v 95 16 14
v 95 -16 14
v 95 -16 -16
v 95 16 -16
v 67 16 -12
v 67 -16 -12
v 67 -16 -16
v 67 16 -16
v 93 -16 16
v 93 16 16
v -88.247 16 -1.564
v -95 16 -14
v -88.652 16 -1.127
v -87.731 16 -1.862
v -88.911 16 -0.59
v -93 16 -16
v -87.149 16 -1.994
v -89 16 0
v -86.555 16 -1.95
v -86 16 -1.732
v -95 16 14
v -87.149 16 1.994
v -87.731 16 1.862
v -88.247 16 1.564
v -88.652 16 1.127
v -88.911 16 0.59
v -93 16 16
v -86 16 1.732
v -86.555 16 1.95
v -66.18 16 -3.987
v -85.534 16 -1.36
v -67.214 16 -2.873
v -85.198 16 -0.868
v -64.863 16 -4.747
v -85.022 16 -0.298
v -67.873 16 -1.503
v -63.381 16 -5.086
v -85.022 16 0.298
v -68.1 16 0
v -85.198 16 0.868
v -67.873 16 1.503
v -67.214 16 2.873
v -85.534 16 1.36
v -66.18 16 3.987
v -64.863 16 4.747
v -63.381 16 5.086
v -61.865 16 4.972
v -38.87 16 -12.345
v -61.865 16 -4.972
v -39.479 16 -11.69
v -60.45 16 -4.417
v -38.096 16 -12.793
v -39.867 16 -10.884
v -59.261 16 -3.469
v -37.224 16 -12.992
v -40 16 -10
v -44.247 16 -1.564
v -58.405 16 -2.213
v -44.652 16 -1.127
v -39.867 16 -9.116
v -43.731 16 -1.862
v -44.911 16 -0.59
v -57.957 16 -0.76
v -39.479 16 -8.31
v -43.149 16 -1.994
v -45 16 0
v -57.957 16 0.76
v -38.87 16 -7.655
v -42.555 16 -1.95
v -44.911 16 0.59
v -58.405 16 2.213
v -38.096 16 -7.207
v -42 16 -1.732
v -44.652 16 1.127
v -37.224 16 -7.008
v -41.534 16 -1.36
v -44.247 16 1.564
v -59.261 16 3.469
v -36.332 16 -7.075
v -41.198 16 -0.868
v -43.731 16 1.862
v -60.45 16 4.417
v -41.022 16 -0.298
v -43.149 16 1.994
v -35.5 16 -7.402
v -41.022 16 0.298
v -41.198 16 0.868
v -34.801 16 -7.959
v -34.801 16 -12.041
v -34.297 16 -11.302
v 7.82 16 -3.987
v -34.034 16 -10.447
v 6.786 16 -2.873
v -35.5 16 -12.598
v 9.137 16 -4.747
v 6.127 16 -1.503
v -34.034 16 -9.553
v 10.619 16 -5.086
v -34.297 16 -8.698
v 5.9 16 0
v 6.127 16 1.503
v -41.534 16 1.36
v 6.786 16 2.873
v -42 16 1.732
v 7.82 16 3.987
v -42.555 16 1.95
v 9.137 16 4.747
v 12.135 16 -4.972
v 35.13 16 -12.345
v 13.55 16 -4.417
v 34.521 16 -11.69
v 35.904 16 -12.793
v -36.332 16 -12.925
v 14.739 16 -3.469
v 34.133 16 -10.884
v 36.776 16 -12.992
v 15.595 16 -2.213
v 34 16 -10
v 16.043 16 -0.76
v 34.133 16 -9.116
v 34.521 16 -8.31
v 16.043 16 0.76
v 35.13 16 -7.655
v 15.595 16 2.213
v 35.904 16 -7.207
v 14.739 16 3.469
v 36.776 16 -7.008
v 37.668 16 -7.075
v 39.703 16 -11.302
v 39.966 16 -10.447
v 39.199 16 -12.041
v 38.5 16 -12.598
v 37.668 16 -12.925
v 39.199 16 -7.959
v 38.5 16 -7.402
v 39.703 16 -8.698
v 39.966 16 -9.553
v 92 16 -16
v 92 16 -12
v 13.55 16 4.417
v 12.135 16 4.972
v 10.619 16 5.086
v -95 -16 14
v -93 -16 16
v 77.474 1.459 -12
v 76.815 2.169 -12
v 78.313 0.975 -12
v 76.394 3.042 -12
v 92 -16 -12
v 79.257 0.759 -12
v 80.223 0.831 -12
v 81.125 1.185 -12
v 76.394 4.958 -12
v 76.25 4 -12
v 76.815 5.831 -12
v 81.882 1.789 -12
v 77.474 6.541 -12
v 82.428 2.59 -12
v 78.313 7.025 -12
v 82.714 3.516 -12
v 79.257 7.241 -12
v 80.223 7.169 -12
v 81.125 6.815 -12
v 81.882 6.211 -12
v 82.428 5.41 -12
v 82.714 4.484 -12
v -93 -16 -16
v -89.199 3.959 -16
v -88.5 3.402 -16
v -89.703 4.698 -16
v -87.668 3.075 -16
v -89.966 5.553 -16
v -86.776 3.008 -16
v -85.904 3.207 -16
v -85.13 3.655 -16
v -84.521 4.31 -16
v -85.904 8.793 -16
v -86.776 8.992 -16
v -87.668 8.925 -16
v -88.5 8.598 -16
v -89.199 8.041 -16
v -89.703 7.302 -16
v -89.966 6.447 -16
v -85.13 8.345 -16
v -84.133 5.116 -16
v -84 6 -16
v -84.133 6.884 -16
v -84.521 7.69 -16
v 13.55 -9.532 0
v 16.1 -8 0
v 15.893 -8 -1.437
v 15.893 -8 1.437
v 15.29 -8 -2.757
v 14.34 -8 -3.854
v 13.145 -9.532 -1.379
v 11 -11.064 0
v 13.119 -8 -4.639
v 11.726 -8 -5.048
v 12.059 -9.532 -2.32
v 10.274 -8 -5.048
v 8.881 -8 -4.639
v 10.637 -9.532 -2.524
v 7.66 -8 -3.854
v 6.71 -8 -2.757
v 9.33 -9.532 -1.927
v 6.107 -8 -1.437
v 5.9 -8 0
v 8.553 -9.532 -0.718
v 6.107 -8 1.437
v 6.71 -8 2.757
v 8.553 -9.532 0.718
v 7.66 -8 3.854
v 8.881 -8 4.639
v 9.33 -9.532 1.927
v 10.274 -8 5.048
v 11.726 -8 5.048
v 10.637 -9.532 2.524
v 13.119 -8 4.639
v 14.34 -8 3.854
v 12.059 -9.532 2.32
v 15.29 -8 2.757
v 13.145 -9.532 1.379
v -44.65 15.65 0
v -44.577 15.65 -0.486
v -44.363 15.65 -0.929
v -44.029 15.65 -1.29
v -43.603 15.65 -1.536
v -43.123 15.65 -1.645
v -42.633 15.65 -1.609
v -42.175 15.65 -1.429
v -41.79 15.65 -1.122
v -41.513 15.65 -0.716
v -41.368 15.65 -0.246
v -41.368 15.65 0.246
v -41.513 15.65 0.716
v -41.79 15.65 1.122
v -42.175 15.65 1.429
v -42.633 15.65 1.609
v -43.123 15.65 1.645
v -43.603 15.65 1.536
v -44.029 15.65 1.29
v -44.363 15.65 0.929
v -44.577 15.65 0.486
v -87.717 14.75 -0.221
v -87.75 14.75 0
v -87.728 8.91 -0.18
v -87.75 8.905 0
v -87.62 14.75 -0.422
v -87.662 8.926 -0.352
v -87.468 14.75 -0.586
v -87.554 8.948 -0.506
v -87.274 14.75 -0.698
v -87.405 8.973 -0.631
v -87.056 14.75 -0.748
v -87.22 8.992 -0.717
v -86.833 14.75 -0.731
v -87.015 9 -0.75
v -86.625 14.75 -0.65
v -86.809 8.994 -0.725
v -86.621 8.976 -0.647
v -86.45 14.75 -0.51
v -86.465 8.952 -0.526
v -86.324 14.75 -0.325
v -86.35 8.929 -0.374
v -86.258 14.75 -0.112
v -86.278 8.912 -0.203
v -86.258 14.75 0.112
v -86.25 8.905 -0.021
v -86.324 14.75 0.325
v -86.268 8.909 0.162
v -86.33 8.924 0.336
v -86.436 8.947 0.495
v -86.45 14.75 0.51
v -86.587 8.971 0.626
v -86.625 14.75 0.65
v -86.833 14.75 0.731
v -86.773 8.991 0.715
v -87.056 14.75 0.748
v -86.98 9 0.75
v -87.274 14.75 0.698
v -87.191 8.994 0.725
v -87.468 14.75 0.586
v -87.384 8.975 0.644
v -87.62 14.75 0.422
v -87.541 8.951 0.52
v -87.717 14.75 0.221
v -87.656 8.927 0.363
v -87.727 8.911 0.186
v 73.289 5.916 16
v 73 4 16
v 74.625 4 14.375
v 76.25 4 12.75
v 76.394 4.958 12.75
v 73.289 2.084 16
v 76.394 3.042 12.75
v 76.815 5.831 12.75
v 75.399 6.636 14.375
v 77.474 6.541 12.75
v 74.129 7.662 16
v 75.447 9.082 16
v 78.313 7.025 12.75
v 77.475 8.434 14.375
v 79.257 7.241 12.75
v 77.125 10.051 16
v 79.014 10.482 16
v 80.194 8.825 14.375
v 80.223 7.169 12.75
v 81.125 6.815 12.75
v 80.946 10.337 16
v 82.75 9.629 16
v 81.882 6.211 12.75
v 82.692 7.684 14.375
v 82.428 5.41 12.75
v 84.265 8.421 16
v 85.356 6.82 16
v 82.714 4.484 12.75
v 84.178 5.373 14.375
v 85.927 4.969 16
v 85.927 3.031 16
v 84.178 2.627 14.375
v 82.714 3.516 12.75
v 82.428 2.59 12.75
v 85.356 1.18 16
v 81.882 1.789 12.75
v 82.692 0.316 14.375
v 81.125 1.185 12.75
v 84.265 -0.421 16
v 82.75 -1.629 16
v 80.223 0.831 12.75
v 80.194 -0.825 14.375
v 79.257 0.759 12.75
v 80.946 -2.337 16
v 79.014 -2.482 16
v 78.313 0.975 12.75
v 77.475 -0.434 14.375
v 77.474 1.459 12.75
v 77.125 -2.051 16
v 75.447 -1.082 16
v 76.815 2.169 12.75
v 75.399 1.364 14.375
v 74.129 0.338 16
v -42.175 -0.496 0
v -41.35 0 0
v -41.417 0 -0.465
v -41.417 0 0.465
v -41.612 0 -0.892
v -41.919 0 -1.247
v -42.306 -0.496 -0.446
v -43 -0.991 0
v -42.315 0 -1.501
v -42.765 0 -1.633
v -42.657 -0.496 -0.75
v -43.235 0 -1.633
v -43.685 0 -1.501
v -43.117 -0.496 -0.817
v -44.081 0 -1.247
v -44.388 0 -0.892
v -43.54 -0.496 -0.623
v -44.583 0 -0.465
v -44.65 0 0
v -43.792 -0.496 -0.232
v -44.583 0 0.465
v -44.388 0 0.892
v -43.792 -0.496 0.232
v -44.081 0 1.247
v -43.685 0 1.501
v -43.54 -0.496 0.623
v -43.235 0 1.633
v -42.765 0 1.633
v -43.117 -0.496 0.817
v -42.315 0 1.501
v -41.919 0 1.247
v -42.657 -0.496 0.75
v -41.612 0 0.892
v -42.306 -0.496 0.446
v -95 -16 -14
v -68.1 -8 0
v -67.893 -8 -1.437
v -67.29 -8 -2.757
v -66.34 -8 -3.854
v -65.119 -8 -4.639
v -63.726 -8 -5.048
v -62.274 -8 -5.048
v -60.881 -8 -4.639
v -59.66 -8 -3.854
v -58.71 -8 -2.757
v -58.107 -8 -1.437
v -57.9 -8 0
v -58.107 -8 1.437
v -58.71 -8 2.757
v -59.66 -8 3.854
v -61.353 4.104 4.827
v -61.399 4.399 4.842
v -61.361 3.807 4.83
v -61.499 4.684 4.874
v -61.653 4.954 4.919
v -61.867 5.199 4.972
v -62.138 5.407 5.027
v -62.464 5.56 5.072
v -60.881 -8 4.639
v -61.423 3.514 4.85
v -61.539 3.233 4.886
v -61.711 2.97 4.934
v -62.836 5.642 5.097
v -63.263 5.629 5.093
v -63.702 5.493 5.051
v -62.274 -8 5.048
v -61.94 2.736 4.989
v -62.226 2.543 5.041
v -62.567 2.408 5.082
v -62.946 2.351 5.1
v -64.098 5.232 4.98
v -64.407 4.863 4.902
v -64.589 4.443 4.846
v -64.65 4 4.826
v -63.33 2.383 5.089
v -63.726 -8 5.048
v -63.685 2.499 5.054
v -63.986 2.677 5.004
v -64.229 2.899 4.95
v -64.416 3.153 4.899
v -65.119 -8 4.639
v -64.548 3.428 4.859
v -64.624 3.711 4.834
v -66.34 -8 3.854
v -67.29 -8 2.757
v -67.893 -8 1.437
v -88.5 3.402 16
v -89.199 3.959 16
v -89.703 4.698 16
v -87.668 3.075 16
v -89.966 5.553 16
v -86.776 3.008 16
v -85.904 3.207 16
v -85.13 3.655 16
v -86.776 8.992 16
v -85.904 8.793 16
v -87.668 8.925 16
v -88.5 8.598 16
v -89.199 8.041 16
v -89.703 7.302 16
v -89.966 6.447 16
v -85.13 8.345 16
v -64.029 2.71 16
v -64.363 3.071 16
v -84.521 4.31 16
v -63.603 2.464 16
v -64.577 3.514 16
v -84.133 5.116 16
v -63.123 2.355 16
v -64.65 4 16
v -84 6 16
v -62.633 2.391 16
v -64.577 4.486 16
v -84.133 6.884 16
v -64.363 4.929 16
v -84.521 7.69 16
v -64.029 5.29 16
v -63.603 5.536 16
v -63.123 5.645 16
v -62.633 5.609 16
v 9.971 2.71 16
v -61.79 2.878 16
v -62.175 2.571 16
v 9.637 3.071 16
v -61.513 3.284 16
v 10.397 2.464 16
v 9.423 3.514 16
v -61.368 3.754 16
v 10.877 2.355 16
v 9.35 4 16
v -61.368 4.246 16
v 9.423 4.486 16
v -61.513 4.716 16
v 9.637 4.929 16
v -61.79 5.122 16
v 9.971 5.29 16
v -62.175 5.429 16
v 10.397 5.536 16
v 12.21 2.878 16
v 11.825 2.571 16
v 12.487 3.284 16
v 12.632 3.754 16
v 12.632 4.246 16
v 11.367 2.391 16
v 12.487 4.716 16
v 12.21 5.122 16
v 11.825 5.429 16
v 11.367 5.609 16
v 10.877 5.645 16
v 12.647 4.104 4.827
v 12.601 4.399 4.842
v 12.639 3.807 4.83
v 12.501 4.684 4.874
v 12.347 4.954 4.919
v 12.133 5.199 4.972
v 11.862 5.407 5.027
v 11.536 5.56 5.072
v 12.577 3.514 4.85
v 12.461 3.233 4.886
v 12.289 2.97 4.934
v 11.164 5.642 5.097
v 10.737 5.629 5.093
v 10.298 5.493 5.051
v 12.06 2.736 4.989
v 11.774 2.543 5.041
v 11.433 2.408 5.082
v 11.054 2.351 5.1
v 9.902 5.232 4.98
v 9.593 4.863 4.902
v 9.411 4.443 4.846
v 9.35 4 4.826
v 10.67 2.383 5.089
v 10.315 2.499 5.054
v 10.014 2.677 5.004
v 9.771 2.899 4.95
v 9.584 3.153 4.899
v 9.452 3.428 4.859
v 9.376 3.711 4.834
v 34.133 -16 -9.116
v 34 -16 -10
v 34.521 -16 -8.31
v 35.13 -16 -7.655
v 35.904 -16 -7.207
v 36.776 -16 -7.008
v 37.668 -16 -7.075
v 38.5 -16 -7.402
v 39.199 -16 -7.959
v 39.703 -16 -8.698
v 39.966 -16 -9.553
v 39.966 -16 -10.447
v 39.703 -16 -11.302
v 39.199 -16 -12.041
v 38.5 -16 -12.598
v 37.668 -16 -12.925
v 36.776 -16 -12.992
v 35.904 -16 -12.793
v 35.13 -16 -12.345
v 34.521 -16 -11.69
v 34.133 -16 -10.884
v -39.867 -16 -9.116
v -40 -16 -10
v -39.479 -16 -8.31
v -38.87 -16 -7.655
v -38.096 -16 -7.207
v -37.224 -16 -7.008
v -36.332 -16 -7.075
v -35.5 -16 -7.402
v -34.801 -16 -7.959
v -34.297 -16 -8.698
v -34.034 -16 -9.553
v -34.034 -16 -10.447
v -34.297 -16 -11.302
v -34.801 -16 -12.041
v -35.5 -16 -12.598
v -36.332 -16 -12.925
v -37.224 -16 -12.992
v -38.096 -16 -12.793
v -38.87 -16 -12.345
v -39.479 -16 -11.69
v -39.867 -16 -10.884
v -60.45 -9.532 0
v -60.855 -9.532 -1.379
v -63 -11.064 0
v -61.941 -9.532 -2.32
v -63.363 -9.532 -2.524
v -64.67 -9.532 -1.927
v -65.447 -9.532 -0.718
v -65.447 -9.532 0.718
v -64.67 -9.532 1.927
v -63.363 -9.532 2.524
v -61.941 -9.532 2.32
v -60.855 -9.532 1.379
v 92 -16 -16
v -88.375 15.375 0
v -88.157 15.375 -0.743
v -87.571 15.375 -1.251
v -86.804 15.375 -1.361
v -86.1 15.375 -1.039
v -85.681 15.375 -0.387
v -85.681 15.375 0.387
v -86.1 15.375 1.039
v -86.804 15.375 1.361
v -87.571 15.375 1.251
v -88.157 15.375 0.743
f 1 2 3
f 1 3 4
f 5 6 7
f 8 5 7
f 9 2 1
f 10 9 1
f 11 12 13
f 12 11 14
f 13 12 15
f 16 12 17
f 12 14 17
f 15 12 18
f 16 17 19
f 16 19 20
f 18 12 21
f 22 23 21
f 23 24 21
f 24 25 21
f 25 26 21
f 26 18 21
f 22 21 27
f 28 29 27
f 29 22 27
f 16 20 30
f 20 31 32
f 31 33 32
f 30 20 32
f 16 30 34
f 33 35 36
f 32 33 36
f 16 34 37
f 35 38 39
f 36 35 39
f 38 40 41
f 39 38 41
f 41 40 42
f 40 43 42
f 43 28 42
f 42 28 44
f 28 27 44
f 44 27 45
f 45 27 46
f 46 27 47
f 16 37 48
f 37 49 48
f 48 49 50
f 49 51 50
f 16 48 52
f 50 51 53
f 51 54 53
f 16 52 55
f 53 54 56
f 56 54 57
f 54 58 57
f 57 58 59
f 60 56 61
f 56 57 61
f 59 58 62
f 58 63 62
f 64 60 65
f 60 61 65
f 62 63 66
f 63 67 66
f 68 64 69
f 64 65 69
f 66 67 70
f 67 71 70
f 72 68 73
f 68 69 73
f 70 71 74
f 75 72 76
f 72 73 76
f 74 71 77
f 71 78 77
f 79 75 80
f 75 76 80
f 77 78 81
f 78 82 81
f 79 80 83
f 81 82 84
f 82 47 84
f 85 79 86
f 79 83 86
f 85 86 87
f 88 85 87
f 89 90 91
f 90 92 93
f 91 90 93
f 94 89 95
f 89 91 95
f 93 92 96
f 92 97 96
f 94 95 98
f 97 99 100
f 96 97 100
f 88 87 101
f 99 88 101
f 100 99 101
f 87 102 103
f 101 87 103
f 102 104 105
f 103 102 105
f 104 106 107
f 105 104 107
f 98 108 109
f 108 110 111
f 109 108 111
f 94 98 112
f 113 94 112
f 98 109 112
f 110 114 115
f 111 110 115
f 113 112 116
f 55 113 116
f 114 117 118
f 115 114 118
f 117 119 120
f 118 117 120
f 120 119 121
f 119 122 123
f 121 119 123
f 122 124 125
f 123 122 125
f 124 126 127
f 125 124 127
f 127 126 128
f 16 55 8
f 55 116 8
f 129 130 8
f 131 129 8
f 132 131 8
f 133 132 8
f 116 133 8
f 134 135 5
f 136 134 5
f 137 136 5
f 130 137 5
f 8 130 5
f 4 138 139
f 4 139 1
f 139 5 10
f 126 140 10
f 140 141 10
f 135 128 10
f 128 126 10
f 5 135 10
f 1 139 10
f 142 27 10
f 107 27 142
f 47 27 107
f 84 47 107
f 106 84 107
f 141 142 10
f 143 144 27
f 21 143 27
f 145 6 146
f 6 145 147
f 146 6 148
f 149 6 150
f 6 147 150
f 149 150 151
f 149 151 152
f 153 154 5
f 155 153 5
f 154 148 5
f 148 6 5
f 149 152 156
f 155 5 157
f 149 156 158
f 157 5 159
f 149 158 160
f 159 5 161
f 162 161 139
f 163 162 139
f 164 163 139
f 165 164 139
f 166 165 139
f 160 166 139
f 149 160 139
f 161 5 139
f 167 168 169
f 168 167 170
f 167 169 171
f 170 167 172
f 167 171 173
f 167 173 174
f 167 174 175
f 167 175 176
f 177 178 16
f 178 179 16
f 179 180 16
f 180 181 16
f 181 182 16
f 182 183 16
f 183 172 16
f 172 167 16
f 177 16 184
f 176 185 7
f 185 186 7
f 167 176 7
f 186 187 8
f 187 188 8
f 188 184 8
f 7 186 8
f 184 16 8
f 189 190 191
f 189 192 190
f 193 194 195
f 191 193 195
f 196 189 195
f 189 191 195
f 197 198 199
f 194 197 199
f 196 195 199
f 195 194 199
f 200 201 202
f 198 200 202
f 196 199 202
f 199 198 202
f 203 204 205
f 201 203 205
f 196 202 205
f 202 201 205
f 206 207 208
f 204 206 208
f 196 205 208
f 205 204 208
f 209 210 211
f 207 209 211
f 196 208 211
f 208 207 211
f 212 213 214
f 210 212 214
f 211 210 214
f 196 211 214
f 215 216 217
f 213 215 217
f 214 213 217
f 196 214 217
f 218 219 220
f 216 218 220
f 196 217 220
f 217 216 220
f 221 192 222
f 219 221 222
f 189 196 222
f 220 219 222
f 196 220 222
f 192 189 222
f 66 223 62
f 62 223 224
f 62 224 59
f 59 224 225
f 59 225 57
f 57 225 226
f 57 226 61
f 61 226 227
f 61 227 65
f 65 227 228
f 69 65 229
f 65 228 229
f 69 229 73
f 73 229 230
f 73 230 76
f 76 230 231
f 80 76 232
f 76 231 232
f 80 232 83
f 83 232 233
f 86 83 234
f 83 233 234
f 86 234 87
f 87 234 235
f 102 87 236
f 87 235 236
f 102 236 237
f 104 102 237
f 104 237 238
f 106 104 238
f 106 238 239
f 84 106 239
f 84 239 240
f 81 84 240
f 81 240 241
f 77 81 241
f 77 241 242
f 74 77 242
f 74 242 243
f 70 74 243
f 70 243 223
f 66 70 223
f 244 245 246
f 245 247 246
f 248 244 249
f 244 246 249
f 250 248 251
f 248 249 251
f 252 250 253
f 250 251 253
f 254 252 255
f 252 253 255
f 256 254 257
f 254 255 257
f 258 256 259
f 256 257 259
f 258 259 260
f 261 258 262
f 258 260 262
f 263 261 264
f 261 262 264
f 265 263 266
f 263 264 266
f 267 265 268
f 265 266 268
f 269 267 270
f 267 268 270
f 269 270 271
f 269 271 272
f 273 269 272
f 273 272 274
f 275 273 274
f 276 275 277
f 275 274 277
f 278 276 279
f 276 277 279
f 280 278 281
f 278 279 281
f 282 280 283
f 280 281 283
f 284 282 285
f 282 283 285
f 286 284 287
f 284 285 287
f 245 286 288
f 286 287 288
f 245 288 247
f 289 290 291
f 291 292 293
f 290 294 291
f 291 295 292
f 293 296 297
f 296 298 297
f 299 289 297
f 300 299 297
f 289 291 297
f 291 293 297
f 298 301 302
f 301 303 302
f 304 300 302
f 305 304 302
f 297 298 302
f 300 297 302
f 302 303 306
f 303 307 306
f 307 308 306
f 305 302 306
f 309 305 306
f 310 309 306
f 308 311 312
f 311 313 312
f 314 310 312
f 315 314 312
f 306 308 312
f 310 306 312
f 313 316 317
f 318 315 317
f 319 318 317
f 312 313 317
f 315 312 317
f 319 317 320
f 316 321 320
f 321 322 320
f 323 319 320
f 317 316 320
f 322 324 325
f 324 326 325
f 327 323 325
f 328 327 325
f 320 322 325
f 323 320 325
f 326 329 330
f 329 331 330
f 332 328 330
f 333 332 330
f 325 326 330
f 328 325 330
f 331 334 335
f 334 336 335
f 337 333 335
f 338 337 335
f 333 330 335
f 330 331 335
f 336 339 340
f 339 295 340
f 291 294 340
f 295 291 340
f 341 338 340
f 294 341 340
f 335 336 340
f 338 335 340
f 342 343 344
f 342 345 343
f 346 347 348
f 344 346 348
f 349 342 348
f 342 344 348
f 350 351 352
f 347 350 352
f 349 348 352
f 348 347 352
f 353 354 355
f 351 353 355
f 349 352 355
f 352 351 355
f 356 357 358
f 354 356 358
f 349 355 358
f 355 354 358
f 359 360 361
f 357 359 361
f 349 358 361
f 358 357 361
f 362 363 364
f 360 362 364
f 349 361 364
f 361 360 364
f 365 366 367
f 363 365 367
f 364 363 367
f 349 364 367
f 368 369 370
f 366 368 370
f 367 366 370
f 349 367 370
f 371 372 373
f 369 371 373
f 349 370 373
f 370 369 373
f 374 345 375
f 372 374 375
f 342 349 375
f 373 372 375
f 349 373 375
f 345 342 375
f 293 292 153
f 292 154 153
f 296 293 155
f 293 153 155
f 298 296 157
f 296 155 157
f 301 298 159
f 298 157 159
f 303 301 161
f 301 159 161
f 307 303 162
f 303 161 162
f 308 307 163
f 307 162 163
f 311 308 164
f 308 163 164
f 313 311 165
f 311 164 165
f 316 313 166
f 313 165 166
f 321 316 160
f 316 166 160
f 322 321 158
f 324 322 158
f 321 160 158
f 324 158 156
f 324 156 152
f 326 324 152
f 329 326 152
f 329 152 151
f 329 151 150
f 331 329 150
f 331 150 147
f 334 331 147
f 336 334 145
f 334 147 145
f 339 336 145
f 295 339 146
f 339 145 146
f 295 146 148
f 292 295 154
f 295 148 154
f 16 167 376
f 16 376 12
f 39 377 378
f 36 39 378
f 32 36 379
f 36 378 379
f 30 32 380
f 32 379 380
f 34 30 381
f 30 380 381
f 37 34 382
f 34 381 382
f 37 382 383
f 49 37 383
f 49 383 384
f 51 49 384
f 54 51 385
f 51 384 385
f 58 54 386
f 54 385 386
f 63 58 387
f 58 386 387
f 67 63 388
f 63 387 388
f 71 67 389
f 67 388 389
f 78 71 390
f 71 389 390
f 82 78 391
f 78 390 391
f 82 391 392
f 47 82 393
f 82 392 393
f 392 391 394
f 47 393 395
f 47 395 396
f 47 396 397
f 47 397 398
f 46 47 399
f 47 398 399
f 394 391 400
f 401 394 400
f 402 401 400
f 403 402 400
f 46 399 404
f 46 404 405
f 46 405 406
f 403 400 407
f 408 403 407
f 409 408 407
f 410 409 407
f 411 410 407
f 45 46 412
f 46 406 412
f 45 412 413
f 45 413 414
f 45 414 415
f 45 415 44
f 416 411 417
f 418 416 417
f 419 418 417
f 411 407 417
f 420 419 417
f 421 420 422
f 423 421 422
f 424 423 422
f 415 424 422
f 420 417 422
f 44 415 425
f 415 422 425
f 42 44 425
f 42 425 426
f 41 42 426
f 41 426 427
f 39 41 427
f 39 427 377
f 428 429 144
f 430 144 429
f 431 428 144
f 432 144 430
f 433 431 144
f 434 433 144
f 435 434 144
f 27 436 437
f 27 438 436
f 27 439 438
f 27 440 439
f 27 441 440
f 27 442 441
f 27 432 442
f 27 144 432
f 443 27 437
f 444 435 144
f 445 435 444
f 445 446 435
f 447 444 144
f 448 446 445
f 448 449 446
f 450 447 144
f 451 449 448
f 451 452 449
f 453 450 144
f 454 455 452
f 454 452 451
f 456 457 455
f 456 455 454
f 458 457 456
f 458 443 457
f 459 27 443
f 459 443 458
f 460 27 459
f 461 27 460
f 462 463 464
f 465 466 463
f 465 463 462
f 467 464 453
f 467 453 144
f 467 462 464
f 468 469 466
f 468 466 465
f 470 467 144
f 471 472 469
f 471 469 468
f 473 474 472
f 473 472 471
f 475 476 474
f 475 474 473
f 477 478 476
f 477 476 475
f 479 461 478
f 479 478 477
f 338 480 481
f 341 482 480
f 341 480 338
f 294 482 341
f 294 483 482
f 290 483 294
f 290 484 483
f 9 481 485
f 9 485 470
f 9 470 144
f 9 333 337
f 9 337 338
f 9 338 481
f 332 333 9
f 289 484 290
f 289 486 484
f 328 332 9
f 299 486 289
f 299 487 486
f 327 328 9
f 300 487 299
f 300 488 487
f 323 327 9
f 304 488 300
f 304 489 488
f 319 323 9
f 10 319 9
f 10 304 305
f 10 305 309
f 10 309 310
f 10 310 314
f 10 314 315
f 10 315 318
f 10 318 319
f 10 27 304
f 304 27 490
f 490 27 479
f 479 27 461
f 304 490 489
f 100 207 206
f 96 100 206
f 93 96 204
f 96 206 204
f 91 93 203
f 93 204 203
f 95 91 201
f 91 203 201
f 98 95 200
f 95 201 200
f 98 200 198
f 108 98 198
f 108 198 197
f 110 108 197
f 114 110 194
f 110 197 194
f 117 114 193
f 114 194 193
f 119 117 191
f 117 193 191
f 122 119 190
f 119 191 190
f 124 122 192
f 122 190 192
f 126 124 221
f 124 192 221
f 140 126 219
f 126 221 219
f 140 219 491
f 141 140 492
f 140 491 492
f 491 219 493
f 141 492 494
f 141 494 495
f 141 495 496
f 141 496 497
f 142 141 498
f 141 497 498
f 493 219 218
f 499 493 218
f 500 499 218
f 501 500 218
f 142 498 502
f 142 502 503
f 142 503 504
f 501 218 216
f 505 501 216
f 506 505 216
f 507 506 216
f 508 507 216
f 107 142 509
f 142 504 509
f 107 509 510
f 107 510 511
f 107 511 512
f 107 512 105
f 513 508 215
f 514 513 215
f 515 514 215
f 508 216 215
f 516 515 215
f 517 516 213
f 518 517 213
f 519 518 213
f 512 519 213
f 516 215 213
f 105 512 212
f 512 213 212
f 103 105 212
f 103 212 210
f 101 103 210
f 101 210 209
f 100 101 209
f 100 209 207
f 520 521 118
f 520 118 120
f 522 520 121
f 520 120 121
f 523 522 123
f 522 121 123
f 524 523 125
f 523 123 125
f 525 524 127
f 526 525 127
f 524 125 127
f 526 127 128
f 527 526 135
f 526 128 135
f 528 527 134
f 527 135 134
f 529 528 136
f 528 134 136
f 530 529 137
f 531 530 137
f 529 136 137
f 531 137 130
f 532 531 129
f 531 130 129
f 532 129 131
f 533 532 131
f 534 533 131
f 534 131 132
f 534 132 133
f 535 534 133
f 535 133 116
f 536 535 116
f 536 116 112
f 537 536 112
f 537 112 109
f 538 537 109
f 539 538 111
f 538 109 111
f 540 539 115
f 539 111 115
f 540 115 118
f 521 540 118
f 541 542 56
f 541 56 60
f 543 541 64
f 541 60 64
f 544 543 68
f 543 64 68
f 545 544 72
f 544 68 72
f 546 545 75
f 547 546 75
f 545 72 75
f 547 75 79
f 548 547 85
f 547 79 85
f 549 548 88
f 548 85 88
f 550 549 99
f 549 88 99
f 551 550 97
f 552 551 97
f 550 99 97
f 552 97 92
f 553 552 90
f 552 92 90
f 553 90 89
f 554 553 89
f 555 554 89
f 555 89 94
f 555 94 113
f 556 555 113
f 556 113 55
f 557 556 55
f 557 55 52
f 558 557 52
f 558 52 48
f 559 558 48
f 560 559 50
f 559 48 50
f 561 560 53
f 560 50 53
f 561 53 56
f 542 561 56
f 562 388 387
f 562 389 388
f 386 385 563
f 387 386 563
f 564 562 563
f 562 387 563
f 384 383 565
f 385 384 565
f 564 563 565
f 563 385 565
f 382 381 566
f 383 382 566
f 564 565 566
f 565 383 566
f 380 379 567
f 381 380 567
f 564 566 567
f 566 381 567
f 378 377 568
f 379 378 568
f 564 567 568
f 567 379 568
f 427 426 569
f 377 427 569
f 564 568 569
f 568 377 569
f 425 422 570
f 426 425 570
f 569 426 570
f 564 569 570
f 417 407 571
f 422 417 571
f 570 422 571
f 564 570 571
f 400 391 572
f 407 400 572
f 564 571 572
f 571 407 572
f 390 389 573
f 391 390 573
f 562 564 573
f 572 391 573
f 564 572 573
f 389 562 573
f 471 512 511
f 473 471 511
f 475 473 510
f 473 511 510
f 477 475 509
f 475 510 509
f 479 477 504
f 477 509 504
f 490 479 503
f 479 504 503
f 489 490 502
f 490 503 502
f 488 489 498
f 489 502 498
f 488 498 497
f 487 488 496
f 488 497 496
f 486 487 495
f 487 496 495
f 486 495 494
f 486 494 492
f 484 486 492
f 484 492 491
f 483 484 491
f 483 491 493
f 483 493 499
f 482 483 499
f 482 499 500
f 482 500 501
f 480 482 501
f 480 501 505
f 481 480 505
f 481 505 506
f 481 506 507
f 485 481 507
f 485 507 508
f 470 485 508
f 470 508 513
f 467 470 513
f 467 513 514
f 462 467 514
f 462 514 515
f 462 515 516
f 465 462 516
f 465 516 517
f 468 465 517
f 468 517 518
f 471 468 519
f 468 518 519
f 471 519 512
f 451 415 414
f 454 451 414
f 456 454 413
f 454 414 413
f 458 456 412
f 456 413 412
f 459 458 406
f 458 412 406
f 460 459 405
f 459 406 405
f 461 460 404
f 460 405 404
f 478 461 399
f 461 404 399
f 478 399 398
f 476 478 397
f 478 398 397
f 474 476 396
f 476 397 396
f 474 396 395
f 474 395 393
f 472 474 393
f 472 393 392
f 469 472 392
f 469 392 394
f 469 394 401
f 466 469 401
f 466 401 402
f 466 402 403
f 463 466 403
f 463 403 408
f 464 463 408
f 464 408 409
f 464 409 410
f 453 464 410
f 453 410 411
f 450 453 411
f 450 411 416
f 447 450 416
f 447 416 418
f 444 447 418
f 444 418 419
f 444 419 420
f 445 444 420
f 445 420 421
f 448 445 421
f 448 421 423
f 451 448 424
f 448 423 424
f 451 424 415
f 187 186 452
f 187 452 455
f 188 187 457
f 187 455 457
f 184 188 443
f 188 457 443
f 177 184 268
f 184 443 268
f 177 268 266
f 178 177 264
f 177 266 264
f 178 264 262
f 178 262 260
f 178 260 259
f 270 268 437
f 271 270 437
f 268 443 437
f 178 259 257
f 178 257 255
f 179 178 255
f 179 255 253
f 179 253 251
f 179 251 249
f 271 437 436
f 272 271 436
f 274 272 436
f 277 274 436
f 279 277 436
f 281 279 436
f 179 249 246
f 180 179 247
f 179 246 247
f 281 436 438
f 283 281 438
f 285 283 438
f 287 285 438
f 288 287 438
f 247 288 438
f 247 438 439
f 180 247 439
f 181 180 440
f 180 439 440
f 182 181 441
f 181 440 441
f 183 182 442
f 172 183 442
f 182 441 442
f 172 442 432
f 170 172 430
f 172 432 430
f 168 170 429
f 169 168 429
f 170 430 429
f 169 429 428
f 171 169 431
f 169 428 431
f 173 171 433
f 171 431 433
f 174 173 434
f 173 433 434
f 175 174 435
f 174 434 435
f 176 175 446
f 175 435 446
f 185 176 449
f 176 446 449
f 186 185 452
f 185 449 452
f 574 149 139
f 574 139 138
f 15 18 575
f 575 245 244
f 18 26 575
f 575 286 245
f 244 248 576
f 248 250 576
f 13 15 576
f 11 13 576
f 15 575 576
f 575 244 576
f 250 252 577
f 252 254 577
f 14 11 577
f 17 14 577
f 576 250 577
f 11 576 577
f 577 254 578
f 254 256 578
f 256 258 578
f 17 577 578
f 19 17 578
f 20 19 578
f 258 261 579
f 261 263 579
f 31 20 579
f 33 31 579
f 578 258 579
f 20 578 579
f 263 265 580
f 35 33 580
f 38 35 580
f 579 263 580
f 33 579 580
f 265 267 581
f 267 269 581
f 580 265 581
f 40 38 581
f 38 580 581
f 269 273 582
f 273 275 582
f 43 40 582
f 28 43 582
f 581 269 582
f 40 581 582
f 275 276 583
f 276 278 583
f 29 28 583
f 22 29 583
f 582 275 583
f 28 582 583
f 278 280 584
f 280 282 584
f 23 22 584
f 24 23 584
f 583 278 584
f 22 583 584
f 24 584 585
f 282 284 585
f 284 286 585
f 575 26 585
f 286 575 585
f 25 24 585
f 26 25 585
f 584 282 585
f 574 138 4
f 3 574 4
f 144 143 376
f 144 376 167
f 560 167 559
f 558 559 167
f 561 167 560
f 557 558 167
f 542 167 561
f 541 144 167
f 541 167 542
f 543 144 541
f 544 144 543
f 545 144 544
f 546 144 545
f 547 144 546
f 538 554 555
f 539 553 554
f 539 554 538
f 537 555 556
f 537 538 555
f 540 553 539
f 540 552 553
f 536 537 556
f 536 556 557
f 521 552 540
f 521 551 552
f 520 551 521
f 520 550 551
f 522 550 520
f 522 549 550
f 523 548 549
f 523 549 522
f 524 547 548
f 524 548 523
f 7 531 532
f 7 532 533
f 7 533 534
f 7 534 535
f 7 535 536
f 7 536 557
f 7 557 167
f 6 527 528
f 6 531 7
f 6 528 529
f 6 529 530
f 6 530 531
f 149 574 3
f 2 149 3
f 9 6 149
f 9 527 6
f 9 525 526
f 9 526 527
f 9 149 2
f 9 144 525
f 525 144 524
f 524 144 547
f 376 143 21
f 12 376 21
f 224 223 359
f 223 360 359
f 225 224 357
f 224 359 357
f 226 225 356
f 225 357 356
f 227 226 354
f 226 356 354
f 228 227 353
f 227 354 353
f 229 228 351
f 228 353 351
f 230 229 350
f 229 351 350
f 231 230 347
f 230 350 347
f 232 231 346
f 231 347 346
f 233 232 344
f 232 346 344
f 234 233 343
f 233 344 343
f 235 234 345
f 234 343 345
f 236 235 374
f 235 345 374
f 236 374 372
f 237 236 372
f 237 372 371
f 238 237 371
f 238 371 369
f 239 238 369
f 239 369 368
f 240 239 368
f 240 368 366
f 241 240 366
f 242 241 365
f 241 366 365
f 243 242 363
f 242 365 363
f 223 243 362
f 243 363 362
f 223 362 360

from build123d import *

# Parameters (mm, degrees)
SKETCH1_W                                            = 190
SKETCH1_H                                            = 32
BOSS_EXTRUDE1_DEPTH                                  = 16
SKETCH2_W                                            = 25
SKETCH2_H                                            = 4
CUT_EXTRUDE1_DEPTH                                   = 102.513545894
M12_TAPPED_HOLE1_D                                   = 10.2
M12_TAPPED_HOLE1_DEPTH                               = 24
M12_TAPPED_HOLE1_TIP                                 = 3.064389157
M4_TAPPED_HOLE1_D                                    = 3.3
M4_TAPPED_HOLE1_DEPTH                                = 11.5
M4_TAPPED_HOLE1_TIP                                  = 0.991420021
SKETCH13_R                                           = 3
CUT_EXTRUDE2_DEPTH                                   = 102.51354591
CSK_FOR_M4_COUNTERSUNK_FLAT_HEAD_SCREW1_D            = 1.5
CSK_FOR_M4_COUNTERSUNK_FLAT_HEAD_SCREW1_DEPTH        = 10
CSK_FOR_M4_COUNTERSUNK_FLAT_HEAD_SCREW1_CSINK_D      = 4
CSK_FOR_M4_COUNTERSUNK_FLAT_HEAD_SCREW1_CSINK_ANGLE  = 90
CSK_FOR_M4_COUNTERSUNK_FLAT_HEAD_SCREW1_TIP          = 0.450645464
M4_TAPPED_HOLE3_D                                    = 3.3
M4_TAPPED_HOLE3_DEPTH                                = 16
M4_TAPPED_HOLE3_CSINK_D                              = 4
M4_TAPPED_HOLE3_CSINK_ANGLE                          = 90
M4_TAPPED_HOLE3_TIP                                  = 0.991420021
SKETCH26_R                                           = 3
CUT_EXTRUDE4_DEPTH                                   = 32
CSK_FOR_M10_COUNTERSUNK_FLAT_HEAD_SCREW3_D           = 6.5
CSK_FOR_M10_COUNTERSUNK_FLAT_HEAD_SCREW3_CSINK_D     = 13
CSK_FOR_M10_COUNTERSUNK_FLAT_HEAD_SCREW3_CSINK_ANGLE = 90
CHAMFER3_SIZE                                        = 2


with BuildPart() as part:
    # Sketch1 → Boss-Extrude1 (new, symmetric)
    with BuildSketch(Plane.XY):
        Rectangle(SKETCH1_W, SKETCH1_H)
    extrude(amount=BOSS_EXTRUDE1_DEPTH, both=True)

    # Sketch2 → Cut-Extrude1 (cut, through all)
    with BuildSketch(Plane(origin=(0, 16, 0), x_dir=(1, 0, 0), z_dir=(0, 1, 0))):
        with Locations((79.5, 14)):
            Rectangle(SKETCH2_W, SKETCH2_H)
    extrude(amount=-CUT_EXTRUDE1_DEPTH, mode=Mode.SUBTRACT)

    # M12 Tapped Hole1
    with Locations(Plane(origin=(0, 16, 0), x_dir=(1, 0, 0), z_dir=(0, 1, 0))):
        with Locations((-63, 0), (11, 0)):
            Hole(M12_TAPPED_HOLE1_D / 2, depth=M12_TAPPED_HOLE1_DEPTH)
            with Locations((0, 0, -(M12_TAPPED_HOLE1_DEPTH + M12_TAPPED_HOLE1_TIP / 2))):  # 118° drill point
                Cone(0, M12_TAPPED_HOLE1_D / 2, M12_TAPPED_HOLE1_TIP, mode=Mode.SUBTRACT)

    # M4 Tapped Hole1
    with Locations(Plane.XY.offset(16)):
        with Locations((-63, 4), (11, 4)):
            Hole(M4_TAPPED_HOLE1_D / 2, depth=M4_TAPPED_HOLE1_DEPTH)
            with Locations((0, 0, -(M4_TAPPED_HOLE1_DEPTH + M4_TAPPED_HOLE1_TIP / 2))):  # 118° drill point
                Cone(0, M4_TAPPED_HOLE1_D / 2, M4_TAPPED_HOLE1_TIP, mode=Mode.SUBTRACT)

    # Sketch13 → Cut-Extrude2 (cut, through all)
    with BuildSketch(Plane.XY.offset(16)):
        with Locations((-87, 6)):
            Circle(SKETCH13_R)
    extrude(amount=-CUT_EXTRUDE2_DEPTH, mode=Mode.SUBTRACT)

    # CSK for M4 Countersunk Flat Head Screw1
    with Locations(Plane(origin=(0, 16, 0), x_dir=(1, 0, 0), z_dir=(0, 1, 0))):
        with Locations((-87, 0)):
            CounterSinkHole(CSK_FOR_M4_COUNTERSUNK_FLAT_HEAD_SCREW1_D / 2, CSK_FOR_M4_COUNTERSUNK_FLAT_HEAD_SCREW1_CSINK_D / 2, depth=CSK_FOR_M4_COUNTERSUNK_FLAT_HEAD_SCREW1_DEPTH, counter_sink_angle=CSK_FOR_M4_COUNTERSUNK_FLAT_HEAD_SCREW1_CSINK_ANGLE)
            with Locations((0, 0, -(CSK_FOR_M4_COUNTERSUNK_FLAT_HEAD_SCREW1_DEPTH + CSK_FOR_M4_COUNTERSUNK_FLAT_HEAD_SCREW1_TIP / 2))):  # 118° drill point
                Cone(0, CSK_FOR_M4_COUNTERSUNK_FLAT_HEAD_SCREW1_D / 2, CSK_FOR_M4_COUNTERSUNK_FLAT_HEAD_SCREW1_TIP, mode=Mode.SUBTRACT)

    # M4 Tapped Hole3
    with Locations(Plane(origin=(0, 16, 0), x_dir=(1, 0, 0), z_dir=(0, 1, 0))):
        with Locations((-43, 0)):
            CounterSinkHole(M4_TAPPED_HOLE3_D / 2, M4_TAPPED_HOLE3_CSINK_D / 2, depth=M4_TAPPED_HOLE3_DEPTH, counter_sink_angle=M4_TAPPED_HOLE3_CSINK_ANGLE)
            with Locations((0, 0, -(M4_TAPPED_HOLE3_DEPTH + M4_TAPPED_HOLE3_TIP / 2))):  # 118° drill point
                Cone(0, M4_TAPPED_HOLE3_D / 2, M4_TAPPED_HOLE3_TIP, mode=Mode.SUBTRACT)

    # Sketch26 → Cut-Extrude4 (cut)
    with BuildSketch(Plane(origin=(0, 16, 0), x_dir=(1, 0, 0), z_dir=(0, 1, 0))):
        with Locations(Location((-37, 10, 0), (0, 0, 180))):
            Circle(SKETCH26_R)
        with Locations(Location((37, 10, 0), (0, 0, 180))):
            Circle(SKETCH26_R)
    extrude(amount=-CUT_EXTRUDE4_DEPTH, mode=Mode.SUBTRACT)

    # CSK for M10 Countersunk Flat Head Screw3 (through all)
    with Locations(Plane.XY.offset(16)):
        with Locations((79.5, 4)):
            CounterSinkHole(CSK_FOR_M10_COUNTERSUNK_FLAT_HEAD_SCREW3_D / 2, CSK_FOR_M10_COUNTERSUNK_FLAT_HEAD_SCREW3_CSINK_D / 2, counter_sink_angle=CSK_FOR_M10_COUNTERSUNK_FLAT_HEAD_SCREW3_CSINK_ANGLE)

    # Chamfer3
    chamfer3_edges = [part.edges().sort_by_distance(p)[0] for p in [
        (95, 0, 16),
        (-95, 0, 16),
        (-95, 0, -16),
    ]]
    chamfer(chamfer3_edges, length=CHAMFER3_SIZE)


solid = part.part
